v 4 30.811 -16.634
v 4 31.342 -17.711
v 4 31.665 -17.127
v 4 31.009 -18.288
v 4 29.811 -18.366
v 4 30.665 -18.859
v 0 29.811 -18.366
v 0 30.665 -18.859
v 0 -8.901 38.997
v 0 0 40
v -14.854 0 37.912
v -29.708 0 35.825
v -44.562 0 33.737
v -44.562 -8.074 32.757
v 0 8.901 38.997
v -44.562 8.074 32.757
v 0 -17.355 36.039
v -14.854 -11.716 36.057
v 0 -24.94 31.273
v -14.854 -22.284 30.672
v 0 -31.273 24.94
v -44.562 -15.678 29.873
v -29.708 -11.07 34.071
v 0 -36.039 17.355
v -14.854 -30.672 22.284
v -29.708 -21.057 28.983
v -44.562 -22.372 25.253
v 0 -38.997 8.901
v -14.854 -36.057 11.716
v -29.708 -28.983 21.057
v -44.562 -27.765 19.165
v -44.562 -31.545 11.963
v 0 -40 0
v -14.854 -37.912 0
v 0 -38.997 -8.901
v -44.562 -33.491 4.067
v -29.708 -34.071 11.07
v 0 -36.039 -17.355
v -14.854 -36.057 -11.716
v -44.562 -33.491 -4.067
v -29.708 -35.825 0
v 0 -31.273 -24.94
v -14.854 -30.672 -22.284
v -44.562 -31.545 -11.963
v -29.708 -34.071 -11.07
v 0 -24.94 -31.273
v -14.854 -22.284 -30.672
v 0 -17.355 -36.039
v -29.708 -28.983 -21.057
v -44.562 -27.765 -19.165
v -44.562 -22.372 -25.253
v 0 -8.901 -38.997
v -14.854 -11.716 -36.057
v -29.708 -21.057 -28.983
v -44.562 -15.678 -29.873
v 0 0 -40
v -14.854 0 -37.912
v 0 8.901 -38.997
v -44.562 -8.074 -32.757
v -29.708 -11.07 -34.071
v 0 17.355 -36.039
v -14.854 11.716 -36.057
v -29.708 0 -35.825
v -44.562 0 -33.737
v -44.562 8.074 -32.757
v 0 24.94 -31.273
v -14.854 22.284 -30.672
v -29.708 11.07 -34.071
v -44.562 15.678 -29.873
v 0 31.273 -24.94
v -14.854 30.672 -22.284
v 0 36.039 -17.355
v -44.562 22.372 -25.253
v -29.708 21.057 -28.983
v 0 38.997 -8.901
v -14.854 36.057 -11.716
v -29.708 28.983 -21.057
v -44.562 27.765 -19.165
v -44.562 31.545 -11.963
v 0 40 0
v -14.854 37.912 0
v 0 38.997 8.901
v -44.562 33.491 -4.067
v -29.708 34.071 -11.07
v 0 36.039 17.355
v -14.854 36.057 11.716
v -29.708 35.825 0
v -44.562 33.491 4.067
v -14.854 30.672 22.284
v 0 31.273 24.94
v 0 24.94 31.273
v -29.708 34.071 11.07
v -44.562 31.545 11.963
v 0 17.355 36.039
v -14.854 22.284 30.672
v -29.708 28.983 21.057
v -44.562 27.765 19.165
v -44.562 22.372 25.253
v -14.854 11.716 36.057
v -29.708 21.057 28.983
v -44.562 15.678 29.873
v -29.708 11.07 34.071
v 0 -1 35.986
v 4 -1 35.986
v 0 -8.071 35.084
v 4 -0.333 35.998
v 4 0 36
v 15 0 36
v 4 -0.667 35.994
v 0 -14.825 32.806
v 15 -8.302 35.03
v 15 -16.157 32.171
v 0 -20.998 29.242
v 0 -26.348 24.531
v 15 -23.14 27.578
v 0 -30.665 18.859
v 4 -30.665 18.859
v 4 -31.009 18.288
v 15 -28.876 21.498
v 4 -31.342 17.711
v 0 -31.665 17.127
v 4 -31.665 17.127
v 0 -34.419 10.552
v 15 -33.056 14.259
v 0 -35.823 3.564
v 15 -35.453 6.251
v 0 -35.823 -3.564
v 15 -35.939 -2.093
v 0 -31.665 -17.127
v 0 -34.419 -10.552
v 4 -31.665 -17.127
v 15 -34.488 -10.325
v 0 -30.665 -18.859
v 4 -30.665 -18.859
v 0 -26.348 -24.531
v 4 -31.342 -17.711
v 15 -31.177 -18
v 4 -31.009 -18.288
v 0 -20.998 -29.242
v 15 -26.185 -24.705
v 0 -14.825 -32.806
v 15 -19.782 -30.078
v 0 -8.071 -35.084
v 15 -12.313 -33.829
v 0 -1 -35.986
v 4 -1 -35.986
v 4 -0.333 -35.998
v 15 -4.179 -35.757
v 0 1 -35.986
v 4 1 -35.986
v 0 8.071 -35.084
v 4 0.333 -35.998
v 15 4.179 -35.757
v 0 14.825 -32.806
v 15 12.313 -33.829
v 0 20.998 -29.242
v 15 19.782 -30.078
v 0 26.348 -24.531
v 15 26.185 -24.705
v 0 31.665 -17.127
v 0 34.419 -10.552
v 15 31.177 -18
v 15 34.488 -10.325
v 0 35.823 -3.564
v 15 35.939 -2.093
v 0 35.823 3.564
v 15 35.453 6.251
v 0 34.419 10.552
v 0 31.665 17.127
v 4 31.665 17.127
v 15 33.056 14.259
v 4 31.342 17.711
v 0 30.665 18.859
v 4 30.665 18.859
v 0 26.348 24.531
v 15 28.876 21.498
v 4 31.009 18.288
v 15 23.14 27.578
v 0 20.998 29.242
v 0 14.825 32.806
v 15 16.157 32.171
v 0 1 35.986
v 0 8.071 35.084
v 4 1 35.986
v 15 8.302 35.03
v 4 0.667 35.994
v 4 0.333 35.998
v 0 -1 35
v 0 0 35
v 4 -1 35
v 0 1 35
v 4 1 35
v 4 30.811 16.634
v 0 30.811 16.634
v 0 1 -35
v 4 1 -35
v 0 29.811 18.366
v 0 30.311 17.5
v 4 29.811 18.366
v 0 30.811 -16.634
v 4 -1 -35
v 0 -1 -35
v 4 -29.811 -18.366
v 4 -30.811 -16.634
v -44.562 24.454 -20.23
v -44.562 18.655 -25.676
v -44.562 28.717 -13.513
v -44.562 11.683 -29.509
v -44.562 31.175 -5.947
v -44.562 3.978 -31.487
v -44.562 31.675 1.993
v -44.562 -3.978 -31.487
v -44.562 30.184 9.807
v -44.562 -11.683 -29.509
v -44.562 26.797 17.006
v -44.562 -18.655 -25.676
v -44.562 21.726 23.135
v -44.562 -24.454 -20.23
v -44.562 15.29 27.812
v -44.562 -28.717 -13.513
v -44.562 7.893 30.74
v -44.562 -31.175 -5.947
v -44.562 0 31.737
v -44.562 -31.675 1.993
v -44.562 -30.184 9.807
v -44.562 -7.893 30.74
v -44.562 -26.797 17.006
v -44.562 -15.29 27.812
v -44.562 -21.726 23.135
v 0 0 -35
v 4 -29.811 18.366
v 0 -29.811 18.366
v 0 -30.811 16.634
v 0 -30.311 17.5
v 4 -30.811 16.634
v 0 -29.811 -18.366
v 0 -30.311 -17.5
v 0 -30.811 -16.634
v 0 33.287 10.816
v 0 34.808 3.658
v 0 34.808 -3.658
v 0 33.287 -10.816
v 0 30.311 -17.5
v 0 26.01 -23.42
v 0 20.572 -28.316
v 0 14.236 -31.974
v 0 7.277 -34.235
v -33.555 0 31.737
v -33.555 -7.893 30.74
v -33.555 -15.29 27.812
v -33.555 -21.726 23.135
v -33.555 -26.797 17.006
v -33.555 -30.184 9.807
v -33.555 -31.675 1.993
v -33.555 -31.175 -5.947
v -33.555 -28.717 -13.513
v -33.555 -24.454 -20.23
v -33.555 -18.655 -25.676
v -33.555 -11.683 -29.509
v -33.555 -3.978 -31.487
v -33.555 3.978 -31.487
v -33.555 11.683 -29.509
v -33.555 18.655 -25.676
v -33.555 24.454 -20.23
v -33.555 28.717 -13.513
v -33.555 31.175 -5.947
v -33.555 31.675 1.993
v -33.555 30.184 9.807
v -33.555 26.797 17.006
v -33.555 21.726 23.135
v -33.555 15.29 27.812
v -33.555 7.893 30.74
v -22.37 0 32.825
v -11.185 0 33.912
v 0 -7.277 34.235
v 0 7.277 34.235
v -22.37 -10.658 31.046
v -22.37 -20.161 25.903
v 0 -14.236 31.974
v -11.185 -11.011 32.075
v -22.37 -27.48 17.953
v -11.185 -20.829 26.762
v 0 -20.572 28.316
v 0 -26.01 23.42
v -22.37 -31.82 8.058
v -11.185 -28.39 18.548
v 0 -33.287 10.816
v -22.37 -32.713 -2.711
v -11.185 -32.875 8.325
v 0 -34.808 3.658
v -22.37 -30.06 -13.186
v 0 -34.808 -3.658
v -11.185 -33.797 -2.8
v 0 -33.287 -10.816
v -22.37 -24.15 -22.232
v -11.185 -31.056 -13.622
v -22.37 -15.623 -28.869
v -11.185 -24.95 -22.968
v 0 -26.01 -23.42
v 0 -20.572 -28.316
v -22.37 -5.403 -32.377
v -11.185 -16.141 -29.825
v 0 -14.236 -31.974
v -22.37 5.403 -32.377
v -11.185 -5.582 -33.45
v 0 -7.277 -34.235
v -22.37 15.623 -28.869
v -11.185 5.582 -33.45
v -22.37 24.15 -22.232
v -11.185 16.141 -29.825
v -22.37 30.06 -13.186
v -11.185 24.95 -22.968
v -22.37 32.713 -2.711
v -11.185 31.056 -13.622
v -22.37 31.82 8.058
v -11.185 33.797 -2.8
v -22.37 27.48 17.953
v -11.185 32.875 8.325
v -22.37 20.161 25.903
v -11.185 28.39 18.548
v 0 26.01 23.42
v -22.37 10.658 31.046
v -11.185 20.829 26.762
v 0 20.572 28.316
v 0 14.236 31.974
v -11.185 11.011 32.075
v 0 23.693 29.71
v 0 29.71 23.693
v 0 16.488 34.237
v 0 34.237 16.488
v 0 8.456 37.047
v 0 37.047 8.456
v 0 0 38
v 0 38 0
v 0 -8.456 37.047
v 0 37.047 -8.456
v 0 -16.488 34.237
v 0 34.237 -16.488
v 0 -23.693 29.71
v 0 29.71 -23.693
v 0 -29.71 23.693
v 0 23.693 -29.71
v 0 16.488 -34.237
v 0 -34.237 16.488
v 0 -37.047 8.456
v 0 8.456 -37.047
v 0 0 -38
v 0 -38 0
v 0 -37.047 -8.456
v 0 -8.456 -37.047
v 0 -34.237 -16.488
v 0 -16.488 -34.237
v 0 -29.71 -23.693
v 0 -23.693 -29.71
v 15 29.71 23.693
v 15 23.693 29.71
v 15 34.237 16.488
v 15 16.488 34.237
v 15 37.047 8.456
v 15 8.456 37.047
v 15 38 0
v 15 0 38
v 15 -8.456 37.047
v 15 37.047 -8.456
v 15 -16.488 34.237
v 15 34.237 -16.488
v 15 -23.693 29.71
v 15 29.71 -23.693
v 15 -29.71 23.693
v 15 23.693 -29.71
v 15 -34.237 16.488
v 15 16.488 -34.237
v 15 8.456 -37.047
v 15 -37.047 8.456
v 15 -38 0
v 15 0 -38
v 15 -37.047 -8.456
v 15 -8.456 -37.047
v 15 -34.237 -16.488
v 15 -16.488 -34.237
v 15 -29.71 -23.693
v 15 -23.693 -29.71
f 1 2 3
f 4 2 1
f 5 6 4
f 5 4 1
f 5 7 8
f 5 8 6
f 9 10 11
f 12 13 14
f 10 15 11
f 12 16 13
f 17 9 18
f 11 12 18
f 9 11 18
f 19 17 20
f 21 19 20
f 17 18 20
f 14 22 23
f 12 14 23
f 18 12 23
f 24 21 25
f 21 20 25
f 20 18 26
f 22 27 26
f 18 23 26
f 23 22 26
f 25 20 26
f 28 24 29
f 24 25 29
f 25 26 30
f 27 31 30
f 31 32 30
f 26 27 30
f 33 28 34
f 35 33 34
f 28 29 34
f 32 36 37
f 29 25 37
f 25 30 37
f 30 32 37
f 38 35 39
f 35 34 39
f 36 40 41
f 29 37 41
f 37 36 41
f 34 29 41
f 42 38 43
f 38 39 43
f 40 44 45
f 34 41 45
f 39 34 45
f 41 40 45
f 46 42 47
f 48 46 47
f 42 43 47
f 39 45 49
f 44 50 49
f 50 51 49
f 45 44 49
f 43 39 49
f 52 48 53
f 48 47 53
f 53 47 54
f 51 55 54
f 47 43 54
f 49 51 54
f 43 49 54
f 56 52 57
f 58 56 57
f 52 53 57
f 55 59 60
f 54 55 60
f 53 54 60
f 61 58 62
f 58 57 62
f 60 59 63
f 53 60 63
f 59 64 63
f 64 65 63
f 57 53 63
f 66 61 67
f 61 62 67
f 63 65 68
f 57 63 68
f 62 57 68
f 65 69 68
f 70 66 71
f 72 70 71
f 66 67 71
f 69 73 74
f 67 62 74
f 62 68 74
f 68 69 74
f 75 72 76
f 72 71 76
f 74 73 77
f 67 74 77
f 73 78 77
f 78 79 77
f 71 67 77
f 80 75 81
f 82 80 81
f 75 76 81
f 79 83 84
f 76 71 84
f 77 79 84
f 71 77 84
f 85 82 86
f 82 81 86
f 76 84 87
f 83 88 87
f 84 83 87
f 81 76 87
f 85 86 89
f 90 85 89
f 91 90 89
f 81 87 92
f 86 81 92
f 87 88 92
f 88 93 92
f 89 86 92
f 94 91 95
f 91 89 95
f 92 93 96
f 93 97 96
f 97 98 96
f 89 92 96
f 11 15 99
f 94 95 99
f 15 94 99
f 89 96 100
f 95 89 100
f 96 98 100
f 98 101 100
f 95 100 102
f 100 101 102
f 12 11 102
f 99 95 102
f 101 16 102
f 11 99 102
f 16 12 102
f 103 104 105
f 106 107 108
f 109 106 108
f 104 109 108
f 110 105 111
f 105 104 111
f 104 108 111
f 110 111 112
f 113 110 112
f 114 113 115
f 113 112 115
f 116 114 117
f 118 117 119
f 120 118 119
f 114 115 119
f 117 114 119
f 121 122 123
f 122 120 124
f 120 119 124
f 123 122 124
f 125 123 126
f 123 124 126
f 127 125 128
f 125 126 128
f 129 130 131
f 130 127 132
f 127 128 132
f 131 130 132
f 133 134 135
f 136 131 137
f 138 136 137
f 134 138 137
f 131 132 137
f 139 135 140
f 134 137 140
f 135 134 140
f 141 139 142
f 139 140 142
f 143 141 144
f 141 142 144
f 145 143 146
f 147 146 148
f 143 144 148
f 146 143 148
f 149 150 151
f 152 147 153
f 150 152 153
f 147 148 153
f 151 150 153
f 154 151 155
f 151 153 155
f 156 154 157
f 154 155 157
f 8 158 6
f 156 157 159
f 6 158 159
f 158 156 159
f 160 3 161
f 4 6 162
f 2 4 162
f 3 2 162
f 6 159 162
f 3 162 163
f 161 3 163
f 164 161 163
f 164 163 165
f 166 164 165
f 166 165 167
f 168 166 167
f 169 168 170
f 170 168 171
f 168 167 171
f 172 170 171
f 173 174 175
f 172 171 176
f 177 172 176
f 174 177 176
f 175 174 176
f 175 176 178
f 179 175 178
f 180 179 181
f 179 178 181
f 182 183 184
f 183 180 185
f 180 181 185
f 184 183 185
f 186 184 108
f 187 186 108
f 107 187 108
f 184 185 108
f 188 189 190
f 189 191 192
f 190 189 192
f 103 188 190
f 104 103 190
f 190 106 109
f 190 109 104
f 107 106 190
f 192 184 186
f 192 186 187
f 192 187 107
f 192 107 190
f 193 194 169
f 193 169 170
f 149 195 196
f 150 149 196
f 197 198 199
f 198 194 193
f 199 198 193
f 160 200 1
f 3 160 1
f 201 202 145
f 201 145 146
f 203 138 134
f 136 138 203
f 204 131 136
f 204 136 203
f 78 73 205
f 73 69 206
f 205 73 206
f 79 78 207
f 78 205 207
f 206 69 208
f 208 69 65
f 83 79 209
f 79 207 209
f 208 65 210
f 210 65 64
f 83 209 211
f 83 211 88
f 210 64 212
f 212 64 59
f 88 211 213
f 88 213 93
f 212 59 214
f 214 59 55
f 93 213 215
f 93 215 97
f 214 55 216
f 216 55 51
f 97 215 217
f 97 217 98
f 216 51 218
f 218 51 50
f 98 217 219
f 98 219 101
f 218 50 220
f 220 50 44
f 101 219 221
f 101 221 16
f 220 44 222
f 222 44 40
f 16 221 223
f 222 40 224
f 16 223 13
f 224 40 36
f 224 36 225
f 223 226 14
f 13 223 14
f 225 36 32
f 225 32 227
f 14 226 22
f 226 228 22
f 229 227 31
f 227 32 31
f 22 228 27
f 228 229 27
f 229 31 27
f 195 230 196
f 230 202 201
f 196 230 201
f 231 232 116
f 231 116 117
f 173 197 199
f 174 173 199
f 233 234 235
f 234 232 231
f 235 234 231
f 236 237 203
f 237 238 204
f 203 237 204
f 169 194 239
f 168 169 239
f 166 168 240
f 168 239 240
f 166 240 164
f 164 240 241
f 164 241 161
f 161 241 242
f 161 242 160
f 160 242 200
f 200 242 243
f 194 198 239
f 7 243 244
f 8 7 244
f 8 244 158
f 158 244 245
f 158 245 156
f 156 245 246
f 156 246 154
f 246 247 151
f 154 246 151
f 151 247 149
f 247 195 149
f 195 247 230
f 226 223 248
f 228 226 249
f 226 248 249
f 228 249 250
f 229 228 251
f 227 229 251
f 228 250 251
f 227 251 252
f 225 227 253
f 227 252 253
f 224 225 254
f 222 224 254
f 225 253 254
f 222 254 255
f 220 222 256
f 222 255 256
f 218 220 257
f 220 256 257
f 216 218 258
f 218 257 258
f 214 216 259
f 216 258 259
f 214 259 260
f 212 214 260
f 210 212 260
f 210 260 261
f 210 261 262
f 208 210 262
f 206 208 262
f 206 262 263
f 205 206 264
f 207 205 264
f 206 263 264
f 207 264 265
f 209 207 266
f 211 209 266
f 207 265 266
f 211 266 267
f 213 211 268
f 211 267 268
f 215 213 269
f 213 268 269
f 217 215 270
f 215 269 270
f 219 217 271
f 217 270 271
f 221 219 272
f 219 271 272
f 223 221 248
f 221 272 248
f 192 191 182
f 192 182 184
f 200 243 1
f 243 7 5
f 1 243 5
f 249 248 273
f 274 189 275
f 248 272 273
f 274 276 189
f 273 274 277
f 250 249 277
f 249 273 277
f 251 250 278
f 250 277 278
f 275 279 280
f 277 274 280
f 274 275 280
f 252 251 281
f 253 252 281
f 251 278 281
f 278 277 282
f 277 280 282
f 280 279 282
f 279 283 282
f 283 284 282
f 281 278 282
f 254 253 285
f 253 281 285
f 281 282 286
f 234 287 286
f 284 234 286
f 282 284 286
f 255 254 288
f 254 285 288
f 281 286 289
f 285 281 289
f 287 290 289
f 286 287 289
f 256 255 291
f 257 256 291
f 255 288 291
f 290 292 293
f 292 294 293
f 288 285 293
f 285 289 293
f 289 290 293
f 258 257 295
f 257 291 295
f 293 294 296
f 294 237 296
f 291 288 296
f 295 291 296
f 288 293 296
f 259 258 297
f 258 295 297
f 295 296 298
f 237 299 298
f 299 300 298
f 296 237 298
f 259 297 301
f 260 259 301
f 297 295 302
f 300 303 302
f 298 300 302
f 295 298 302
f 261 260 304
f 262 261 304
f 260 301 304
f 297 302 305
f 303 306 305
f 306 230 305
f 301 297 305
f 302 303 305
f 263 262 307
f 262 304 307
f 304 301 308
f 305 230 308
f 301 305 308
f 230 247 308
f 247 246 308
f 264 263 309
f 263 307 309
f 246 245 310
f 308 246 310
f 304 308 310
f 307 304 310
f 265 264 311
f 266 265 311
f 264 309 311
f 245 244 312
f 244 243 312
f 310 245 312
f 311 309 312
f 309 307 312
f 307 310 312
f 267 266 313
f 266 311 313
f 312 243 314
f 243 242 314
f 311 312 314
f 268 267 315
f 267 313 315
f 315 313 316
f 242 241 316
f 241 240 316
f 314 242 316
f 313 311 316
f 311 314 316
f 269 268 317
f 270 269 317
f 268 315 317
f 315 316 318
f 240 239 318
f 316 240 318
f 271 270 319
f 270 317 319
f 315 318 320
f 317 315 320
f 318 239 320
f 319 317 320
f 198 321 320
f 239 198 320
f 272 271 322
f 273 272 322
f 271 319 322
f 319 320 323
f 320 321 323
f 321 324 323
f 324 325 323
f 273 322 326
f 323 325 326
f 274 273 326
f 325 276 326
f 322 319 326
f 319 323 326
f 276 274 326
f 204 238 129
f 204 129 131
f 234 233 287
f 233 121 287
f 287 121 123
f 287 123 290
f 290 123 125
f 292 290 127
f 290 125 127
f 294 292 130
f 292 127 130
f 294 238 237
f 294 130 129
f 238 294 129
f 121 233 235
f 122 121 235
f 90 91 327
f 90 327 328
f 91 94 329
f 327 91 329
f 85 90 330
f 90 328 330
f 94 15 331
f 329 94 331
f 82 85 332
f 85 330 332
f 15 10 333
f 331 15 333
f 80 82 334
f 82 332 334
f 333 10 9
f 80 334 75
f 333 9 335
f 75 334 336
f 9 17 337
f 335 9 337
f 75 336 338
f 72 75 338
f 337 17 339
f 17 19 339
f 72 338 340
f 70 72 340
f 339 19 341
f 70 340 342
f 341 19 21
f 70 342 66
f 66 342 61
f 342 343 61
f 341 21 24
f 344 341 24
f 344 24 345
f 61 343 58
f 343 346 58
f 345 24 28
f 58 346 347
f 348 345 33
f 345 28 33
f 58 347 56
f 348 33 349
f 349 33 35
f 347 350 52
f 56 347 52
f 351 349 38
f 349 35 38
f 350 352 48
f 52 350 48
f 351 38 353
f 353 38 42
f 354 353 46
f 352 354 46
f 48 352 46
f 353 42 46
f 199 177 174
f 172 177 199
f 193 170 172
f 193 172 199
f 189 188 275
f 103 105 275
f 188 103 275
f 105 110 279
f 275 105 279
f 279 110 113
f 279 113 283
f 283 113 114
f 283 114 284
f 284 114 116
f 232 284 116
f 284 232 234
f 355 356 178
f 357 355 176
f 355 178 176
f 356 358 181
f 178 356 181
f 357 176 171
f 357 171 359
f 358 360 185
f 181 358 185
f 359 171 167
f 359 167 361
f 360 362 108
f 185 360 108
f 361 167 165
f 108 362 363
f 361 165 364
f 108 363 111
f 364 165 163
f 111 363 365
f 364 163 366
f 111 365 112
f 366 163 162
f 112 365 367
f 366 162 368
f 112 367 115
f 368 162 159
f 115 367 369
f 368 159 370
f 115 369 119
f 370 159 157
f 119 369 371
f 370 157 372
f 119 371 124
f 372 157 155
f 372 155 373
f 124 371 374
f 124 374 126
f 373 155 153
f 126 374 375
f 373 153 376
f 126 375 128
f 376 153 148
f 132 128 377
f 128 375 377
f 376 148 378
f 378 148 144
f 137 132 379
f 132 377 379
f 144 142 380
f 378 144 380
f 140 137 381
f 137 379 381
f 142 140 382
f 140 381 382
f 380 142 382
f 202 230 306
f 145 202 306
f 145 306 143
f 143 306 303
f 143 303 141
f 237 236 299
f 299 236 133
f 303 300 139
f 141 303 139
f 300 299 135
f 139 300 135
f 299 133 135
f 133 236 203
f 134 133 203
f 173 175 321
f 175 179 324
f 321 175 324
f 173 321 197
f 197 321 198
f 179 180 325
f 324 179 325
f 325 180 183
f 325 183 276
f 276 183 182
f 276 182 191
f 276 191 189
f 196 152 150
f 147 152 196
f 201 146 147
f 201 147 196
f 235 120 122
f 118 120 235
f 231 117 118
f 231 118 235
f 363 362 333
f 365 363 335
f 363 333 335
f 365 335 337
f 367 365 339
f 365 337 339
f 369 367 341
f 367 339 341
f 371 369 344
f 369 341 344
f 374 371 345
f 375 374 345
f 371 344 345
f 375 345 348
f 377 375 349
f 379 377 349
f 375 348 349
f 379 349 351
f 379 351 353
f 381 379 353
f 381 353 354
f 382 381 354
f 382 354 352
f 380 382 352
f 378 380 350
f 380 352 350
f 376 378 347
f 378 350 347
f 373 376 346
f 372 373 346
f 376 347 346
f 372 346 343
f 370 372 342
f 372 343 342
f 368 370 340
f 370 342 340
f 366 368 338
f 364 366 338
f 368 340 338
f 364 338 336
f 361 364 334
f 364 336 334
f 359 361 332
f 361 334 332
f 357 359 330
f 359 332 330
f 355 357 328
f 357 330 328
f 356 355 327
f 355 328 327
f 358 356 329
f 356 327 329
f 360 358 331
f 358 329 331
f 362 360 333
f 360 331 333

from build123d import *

# Parameters (mm, degrees)
IZIM3_W                     = 4
IZIM3_H                     = 1
Y_KSEKLIK_EKSTR_ZYON1_DEPTH = 1
DAIRESEL_KAPLAMA1_COUNT     = 6


with BuildPart() as part:
    # Çizim1 → Döndür2 (revolve)
    with BuildSketch(Plane.XY):
        Polygon((0, 40), (-44.562063093, 33.737210457), (-44.562063093, 31.737210457), (-33.555064496, 31.737210457), (0, 35), (0, 36), (15, 36), (15, 38), (0, 38), align=None)
    revolve(axis=Axis((-44.316348886, 0, 0), (1, 0, 0)))

    # Çizim3 → Yükseklik-Ekstrüzyon1 (add, symmetric)
    with BuildSketch(Plane(origin=(0, 0, 0), x_dir=(1, 0, 0), z_dir=(0, 1, 0))):
        with Locations((2, -35.5)):
            Rectangle(IZIM3_W, IZIM3_H)
    y_kseklik_ekstr_zyon1 = extrude(amount=Y_KSEKLIK_EKSTR_ZYON1_DEPTH, both=True)

    # Dairesel Kaplama1: Yükseklik-Ekstrüzyon1 ×6 about axis
    dairesel_kaplama1_axis = Axis((0, 0, 0), (-1, 0, 0))
    for i in range(1, DAIRESEL_KAPLAMA1_COUNT):
        add(y_kseklik_ekstr_zyon1.rotate(dairesel_kaplama1_axis, i * 360 / DAIRESEL_KAPLAMA1_COUNT))


solid = part.part
